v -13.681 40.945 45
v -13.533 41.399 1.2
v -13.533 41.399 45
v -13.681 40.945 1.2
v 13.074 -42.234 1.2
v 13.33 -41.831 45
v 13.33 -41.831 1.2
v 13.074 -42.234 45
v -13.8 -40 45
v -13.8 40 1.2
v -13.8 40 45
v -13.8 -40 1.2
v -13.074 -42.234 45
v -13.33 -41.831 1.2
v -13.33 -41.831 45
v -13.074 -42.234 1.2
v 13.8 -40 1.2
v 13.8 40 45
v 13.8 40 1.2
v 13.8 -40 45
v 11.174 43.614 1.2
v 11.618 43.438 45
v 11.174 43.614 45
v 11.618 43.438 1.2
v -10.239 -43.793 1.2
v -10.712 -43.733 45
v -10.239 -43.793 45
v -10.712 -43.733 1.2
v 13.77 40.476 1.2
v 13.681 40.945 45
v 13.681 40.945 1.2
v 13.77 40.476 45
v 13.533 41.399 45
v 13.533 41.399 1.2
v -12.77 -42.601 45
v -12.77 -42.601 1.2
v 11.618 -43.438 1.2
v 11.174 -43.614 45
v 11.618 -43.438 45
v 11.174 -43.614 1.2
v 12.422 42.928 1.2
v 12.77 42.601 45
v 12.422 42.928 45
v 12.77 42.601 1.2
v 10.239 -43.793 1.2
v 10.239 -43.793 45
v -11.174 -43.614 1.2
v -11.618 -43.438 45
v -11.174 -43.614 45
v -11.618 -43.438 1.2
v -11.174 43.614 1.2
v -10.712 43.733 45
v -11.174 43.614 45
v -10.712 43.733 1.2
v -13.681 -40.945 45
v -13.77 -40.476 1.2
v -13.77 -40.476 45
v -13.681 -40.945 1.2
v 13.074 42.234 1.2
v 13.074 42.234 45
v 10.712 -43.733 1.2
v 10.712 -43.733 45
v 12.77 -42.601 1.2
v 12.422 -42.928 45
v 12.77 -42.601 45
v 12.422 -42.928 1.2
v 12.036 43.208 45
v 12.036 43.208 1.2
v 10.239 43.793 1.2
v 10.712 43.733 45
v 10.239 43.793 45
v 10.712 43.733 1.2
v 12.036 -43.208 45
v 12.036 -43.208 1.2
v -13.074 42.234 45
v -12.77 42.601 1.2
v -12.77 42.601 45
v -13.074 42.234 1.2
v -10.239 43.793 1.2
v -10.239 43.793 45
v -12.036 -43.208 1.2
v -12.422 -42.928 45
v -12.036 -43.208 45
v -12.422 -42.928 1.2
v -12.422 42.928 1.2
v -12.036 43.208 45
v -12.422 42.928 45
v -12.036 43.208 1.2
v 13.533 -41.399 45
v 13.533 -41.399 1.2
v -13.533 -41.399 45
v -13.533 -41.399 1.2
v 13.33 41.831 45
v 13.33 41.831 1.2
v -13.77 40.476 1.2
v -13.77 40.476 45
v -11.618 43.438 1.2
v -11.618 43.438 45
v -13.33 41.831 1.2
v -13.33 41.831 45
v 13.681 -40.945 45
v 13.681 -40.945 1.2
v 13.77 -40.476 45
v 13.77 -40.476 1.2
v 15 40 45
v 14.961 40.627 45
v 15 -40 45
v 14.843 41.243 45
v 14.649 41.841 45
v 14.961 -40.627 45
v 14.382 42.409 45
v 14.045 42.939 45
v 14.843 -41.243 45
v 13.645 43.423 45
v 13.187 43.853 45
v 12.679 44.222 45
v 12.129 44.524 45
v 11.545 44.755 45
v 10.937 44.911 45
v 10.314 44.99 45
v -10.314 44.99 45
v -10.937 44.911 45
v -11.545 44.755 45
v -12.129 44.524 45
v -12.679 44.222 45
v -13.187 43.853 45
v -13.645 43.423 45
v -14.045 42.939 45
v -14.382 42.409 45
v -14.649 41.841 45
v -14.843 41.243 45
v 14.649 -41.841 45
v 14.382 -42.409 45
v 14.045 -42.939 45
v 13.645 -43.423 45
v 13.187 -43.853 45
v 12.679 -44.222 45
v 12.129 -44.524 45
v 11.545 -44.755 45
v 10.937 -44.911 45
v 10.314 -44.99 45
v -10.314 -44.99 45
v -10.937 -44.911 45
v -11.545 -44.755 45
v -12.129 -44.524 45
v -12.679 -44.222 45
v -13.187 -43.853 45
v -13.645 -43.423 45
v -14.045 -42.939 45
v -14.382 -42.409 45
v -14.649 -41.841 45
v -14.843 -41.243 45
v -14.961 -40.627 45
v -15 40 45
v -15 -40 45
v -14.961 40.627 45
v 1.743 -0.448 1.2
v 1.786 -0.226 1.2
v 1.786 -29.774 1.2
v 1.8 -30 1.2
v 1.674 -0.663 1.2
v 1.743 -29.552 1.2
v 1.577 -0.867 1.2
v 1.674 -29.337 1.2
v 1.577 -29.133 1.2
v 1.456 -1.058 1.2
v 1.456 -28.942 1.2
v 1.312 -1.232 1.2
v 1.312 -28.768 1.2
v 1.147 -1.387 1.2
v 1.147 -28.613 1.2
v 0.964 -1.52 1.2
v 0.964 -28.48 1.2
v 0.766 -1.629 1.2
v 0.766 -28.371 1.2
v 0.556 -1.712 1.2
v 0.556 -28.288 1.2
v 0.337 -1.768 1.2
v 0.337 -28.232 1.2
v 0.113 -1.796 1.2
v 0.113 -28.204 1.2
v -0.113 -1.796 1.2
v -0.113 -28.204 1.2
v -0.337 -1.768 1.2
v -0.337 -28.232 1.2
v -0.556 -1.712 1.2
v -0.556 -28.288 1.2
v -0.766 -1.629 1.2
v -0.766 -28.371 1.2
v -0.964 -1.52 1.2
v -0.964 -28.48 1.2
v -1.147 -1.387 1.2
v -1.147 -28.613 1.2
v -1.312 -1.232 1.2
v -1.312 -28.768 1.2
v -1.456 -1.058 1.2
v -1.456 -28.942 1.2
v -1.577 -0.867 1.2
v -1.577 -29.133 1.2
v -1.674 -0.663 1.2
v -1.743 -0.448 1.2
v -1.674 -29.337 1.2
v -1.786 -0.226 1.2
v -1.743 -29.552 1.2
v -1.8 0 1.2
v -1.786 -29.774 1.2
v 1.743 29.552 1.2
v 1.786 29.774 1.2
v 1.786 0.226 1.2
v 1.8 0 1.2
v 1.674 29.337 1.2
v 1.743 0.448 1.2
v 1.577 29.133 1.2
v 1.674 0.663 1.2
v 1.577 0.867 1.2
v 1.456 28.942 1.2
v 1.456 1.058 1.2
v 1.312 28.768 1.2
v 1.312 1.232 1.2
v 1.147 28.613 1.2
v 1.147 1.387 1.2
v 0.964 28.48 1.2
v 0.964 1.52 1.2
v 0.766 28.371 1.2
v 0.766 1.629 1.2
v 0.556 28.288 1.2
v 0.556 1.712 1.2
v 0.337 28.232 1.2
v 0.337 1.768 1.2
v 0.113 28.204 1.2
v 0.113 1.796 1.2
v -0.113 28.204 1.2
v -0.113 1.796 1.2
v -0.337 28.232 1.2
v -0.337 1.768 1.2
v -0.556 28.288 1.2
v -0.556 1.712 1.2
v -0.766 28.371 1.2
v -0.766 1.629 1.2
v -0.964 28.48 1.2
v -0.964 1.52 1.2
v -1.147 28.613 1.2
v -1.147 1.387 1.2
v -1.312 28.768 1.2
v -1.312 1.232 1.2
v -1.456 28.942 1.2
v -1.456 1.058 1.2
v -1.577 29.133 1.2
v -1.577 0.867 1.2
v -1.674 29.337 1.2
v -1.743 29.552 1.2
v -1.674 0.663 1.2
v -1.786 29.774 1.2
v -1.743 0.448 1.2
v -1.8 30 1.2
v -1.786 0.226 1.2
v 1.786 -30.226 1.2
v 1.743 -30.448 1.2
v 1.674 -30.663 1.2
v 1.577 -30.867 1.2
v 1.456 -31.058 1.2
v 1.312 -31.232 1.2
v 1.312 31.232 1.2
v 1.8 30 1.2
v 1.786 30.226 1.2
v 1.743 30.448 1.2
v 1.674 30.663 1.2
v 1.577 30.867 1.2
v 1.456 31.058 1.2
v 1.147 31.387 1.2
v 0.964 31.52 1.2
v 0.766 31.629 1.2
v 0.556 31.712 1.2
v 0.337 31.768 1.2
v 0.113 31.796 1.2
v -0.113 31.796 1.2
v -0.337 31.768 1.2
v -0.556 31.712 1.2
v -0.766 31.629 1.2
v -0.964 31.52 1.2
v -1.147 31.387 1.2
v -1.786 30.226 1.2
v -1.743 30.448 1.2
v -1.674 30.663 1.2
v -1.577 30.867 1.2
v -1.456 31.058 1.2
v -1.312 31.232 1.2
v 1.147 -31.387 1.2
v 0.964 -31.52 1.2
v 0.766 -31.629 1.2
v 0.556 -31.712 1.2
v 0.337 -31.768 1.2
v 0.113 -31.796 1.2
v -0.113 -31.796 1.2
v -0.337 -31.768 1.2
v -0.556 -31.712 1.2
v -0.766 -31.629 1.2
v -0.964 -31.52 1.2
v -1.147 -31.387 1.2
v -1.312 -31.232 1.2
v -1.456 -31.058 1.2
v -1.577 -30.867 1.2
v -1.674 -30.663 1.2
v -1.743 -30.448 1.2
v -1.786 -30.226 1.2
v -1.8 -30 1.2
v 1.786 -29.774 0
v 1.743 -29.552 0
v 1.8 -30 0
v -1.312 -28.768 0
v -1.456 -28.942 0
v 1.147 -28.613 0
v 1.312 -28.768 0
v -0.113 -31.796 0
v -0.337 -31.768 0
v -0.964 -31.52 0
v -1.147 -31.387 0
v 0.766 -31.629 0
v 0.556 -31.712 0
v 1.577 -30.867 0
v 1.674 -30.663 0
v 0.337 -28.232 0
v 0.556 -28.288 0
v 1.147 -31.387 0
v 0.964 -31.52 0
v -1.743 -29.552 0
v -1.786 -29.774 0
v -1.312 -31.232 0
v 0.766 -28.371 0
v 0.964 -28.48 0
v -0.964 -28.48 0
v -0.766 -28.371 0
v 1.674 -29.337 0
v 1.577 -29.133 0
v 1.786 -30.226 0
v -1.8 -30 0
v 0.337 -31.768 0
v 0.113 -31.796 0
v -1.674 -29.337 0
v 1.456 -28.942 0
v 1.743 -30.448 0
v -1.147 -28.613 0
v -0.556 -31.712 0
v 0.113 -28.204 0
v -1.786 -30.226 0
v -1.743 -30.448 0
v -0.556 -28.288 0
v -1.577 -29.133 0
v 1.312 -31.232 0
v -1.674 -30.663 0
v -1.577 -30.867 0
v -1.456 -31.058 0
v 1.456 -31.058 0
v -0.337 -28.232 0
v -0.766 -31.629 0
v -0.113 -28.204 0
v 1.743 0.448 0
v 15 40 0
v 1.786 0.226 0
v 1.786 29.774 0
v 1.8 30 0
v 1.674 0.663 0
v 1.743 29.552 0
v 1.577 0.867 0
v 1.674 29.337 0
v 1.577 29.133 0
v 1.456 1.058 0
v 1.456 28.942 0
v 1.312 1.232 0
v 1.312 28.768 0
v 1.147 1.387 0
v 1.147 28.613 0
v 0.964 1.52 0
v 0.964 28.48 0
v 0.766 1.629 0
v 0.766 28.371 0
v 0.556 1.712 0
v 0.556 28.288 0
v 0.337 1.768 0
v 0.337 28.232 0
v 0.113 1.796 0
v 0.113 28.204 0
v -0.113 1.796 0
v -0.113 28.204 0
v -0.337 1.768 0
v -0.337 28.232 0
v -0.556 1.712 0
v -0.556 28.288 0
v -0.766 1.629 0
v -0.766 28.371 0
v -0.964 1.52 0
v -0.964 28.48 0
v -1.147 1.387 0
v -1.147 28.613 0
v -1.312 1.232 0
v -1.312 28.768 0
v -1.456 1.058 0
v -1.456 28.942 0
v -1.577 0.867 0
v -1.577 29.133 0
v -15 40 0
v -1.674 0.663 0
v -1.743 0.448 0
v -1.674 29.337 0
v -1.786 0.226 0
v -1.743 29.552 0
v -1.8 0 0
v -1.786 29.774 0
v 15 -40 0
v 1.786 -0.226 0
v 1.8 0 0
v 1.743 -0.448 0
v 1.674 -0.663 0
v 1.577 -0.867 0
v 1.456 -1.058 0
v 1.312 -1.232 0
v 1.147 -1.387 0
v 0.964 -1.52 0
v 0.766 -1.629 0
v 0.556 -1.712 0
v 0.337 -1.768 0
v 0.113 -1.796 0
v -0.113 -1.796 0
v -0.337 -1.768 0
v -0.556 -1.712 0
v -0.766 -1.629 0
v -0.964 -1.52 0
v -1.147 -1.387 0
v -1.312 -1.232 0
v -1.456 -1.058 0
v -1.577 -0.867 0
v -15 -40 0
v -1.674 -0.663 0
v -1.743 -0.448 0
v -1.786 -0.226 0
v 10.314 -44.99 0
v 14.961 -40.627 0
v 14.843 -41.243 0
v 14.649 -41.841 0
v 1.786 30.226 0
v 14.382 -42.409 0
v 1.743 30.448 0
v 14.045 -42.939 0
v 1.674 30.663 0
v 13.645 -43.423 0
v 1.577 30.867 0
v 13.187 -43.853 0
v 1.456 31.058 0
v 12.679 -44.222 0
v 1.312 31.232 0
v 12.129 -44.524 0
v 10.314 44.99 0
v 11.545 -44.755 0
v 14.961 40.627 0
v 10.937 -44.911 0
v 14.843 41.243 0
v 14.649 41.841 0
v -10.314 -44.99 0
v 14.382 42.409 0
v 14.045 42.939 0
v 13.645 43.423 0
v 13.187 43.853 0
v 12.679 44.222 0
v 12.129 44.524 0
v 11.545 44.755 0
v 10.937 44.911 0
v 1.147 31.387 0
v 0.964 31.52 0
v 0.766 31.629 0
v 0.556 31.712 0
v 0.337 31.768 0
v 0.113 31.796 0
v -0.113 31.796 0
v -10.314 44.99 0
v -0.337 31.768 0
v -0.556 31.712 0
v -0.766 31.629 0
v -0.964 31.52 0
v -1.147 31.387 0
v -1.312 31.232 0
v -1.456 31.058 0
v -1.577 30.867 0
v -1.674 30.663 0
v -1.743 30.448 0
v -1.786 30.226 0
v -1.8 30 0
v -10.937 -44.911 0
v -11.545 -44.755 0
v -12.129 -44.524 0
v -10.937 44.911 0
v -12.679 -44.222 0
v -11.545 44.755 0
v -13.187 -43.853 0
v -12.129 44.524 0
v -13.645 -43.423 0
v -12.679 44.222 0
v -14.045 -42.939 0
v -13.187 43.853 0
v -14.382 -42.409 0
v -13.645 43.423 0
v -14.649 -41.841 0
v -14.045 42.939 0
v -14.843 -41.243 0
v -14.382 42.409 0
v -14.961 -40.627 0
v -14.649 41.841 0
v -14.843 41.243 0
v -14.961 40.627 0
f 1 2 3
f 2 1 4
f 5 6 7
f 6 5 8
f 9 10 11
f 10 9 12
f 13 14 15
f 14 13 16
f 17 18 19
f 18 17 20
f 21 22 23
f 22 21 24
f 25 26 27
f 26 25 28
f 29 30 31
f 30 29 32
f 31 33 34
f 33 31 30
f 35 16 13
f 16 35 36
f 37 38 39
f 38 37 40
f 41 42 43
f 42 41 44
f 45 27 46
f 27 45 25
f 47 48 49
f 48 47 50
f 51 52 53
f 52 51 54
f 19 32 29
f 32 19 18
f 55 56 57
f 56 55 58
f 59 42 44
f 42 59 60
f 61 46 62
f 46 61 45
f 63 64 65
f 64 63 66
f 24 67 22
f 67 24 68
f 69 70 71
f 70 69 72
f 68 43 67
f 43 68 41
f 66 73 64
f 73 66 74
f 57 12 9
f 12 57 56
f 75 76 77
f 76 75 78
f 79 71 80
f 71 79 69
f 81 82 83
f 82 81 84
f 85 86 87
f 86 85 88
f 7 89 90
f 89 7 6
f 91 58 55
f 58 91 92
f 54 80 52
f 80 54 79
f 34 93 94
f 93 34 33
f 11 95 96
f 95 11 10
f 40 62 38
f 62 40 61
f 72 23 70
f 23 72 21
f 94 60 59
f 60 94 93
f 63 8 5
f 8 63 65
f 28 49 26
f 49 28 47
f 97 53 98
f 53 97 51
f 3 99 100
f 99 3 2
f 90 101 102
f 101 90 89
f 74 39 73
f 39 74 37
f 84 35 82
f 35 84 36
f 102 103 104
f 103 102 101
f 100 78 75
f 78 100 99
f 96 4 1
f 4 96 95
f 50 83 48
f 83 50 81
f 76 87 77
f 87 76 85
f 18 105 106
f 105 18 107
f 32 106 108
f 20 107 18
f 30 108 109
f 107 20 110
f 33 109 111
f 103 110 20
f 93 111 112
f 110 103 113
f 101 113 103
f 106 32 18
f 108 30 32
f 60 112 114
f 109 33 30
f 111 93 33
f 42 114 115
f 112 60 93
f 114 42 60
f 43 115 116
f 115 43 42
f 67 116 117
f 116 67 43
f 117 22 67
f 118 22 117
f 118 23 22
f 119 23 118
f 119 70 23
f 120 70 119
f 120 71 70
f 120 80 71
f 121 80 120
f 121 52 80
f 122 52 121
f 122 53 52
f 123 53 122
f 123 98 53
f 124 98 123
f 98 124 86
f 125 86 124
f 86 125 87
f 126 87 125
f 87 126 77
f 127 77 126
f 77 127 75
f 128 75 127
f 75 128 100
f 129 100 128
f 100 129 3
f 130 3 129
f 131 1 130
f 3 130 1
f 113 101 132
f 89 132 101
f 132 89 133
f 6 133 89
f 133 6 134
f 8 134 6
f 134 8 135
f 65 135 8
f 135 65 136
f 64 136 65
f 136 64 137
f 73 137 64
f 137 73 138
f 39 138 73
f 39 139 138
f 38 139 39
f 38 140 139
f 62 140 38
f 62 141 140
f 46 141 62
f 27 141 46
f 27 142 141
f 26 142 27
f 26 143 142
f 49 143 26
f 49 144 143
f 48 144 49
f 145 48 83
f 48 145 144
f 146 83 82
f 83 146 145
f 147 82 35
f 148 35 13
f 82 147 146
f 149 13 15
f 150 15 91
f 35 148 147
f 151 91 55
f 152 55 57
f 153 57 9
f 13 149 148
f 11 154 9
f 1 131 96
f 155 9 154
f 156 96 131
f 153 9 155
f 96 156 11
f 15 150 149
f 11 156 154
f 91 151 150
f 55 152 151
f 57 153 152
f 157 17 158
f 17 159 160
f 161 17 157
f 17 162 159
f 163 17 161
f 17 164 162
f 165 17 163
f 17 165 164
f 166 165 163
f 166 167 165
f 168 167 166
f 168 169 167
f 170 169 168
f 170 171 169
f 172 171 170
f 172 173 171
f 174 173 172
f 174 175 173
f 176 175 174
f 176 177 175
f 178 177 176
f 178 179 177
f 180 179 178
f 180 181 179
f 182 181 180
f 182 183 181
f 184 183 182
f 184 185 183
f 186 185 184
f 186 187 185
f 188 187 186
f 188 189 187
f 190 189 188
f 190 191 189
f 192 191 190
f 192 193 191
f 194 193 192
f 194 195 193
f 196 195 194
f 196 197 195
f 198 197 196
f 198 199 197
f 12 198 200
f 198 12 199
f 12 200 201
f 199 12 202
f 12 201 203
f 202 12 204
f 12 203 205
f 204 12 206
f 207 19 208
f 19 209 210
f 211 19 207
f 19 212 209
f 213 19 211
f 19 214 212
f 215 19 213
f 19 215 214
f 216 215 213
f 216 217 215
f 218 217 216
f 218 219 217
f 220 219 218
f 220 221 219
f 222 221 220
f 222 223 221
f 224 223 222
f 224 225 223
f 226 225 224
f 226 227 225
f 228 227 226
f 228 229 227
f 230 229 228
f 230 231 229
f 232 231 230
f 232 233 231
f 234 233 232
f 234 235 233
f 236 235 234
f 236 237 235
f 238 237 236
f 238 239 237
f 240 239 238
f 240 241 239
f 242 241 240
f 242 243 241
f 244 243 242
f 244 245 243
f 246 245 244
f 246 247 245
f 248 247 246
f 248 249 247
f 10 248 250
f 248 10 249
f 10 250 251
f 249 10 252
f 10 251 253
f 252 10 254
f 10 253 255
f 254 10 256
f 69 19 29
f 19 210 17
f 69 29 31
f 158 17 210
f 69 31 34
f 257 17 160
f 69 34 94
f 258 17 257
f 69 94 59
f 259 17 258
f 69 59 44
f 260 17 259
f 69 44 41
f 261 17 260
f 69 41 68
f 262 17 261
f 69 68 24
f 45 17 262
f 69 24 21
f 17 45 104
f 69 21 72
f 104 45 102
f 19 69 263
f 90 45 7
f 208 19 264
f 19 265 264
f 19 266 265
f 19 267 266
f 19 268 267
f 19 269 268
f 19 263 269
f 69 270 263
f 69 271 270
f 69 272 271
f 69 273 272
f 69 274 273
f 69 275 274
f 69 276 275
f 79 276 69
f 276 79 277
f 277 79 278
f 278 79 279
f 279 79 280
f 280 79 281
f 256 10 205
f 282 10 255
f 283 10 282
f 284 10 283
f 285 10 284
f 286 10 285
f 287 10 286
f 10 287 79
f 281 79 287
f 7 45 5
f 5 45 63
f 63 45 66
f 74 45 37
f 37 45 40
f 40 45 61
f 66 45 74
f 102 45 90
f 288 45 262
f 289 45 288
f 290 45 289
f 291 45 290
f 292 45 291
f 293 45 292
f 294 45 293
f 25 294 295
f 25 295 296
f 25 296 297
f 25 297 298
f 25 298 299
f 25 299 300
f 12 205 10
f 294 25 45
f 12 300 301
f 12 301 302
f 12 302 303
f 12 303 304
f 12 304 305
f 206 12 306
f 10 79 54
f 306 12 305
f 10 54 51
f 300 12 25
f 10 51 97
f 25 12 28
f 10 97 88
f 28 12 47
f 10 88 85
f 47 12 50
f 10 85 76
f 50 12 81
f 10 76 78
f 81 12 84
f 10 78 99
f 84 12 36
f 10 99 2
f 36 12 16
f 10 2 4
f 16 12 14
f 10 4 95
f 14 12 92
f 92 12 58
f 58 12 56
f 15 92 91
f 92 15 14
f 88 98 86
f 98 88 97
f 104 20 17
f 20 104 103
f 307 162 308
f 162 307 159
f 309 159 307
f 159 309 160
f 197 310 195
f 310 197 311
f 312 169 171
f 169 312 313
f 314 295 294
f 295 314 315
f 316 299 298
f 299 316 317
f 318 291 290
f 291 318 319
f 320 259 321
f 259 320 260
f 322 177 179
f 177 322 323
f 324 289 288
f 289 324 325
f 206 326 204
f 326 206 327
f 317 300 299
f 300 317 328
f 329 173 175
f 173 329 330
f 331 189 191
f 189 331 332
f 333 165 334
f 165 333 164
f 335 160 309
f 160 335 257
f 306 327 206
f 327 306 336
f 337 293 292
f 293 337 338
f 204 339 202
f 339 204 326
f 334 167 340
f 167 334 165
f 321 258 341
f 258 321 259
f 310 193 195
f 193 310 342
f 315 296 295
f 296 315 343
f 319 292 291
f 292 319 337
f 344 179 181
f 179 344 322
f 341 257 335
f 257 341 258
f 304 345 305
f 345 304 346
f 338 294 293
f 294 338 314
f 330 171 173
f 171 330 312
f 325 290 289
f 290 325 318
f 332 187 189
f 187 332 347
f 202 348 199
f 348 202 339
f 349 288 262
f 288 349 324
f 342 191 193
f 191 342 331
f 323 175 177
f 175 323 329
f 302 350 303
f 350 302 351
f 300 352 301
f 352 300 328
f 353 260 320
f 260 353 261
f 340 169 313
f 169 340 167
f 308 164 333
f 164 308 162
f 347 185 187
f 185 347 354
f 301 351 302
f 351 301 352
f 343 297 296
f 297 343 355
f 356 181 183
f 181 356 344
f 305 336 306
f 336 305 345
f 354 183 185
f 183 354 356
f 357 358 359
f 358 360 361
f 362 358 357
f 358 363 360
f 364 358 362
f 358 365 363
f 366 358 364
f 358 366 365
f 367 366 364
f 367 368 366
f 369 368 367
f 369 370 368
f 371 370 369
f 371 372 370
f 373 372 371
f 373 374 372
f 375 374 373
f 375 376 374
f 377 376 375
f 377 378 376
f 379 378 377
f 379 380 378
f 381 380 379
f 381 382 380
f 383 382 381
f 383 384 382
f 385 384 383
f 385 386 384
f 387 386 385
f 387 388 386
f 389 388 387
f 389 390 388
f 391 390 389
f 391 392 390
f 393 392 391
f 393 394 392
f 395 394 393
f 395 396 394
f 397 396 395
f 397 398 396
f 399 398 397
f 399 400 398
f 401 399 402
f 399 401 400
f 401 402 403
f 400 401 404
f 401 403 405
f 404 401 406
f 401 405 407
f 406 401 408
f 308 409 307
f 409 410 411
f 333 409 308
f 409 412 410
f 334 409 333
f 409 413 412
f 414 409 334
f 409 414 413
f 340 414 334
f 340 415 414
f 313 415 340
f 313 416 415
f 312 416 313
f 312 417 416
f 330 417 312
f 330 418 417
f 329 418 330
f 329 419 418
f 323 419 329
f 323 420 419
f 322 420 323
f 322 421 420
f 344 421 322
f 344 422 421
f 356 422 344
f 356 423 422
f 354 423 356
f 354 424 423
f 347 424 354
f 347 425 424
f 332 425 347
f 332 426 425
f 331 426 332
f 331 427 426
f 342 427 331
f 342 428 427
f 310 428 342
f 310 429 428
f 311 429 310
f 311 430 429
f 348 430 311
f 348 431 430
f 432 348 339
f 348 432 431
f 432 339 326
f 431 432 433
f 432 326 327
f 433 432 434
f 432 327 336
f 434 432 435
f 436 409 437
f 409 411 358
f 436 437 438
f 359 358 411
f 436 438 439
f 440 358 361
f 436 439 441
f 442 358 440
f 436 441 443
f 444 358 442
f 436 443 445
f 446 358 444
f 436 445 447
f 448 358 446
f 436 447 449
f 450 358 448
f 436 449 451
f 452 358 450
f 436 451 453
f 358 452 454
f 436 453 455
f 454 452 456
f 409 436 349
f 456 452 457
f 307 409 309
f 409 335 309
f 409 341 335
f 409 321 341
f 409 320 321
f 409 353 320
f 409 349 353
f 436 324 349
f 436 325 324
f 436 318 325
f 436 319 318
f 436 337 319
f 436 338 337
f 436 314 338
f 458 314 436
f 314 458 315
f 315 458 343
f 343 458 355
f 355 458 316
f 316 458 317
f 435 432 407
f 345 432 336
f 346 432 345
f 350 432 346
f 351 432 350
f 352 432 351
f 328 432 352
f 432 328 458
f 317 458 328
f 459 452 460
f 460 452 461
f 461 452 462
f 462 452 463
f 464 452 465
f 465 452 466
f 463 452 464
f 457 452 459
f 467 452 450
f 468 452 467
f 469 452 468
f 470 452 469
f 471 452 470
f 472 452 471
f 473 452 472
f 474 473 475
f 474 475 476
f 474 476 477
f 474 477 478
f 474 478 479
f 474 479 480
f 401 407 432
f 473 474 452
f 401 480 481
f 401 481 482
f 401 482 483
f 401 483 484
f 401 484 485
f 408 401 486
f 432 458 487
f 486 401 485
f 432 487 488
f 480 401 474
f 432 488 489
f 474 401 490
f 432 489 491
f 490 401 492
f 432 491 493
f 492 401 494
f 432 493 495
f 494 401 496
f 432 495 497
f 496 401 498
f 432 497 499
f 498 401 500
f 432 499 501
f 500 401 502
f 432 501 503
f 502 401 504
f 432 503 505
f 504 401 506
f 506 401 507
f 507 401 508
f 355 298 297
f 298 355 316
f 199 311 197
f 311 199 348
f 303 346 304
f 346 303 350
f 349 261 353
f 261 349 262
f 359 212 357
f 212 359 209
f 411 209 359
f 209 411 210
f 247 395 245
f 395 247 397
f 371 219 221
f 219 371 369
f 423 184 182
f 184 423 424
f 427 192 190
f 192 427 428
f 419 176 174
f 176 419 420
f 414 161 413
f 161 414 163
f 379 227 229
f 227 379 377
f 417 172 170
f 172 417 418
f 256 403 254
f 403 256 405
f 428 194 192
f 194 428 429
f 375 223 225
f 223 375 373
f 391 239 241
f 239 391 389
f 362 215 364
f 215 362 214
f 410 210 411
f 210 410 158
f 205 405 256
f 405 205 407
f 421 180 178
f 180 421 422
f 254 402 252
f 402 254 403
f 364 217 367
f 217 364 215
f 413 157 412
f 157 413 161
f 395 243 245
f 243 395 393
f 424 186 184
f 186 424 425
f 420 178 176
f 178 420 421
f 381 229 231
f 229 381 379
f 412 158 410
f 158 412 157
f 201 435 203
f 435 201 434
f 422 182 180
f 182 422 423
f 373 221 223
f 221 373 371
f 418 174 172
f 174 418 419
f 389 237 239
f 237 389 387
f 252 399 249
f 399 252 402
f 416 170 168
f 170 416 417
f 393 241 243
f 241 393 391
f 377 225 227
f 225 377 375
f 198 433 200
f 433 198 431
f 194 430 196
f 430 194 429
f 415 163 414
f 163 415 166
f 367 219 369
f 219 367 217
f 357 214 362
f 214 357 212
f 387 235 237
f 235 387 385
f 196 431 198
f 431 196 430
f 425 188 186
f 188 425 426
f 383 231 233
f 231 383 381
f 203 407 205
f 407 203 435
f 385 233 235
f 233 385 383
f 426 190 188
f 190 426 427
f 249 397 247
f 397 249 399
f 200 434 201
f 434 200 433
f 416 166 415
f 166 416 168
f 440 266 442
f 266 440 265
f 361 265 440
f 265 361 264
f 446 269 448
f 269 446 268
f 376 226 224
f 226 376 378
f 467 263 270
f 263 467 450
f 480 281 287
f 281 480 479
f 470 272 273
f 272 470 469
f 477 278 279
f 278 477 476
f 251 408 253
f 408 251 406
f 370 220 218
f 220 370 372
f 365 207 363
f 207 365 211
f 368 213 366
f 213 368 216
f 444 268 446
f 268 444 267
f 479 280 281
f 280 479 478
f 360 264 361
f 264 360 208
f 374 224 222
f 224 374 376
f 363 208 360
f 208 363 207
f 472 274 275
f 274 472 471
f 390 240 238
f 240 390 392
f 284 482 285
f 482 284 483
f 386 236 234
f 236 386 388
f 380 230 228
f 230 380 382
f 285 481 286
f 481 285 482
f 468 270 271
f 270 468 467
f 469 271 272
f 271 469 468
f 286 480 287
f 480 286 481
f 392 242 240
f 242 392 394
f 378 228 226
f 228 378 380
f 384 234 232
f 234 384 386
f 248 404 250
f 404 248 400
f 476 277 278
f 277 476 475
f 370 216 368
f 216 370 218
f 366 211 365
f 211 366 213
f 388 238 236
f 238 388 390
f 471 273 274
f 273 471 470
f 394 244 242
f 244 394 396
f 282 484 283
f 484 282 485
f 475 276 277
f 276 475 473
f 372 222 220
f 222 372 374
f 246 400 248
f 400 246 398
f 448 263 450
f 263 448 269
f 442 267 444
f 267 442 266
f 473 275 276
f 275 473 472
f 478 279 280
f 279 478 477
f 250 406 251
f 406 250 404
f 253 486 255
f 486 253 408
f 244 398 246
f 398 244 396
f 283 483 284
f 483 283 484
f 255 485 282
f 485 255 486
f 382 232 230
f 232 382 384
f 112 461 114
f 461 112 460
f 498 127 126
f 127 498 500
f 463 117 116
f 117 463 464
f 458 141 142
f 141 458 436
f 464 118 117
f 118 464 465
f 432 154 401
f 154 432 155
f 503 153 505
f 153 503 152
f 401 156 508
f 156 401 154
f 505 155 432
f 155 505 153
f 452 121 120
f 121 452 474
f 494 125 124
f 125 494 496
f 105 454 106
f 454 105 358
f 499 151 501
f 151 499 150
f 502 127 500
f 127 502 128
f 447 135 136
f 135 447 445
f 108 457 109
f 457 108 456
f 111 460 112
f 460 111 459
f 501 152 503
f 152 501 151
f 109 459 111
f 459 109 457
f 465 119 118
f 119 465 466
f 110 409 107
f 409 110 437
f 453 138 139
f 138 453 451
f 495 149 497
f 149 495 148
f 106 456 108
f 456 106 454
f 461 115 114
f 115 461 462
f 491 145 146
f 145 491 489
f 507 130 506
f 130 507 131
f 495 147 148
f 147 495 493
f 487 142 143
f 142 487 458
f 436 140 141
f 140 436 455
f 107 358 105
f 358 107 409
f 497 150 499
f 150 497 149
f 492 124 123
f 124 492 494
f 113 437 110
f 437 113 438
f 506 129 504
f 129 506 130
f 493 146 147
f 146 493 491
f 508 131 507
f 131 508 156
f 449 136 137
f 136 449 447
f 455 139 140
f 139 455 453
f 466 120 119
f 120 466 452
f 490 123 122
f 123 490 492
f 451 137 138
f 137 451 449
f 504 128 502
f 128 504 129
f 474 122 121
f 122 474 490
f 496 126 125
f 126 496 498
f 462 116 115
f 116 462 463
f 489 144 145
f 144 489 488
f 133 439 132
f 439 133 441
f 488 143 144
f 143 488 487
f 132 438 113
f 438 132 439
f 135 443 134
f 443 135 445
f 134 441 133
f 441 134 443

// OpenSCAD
$fn = 50;


difference() {
	union() {
		hull() {
			translate(v = [-10.0000000000, 40.0000000000, 0]) {
				cylinder(h = 45, r = 5);
			}
			translate(v = [10.0000000000, 40.0000000000, 0]) {
				cylinder(h = 45, r = 5);
			}
			translate(v = [-10.0000000000, -40.0000000000, 0]) {
				cylinder(h = 45, r = 5);
			}
			translate(v = [10.0000000000, -40.0000000000, 0]) {
				cylinder(h = 45, r = 5);
			}
		}
	}
	union() {
		translate(v = [0, 0, 1.2000000000]) {
			hull() {
				translate(v = [-10.0000000000, 40.0000000000, 0]) {
					cylinder(h = 43.8000000000, r = 3.8000000000);
				}
				translate(v = [10.0000000000, 40.0000000000, 0]) {
					cylinder(h = 43.8000000000, r = 3.8000000000);
				}
				translate(v = [-10.0000000000, -40.0000000000, 0]) {
					cylinder(h = 43.8000000000, r = 3.8000000000);
				}
				translate(v = [10.0000000000, -40.0000000000, 0]) {
					cylinder(h = 43.8000000000, r = 3.8000000000);
				}
			}
		}
		#translate(v = [0.0000000000, -30.0000000000, 0]) {
			cylinder(h = 1.2000000000, r = 1.8000000000);
		}
		#cylinder(h = 1.2000000000, r = 1.8000000000);
		#translate(v = [0.0000000000, 30.0000000000, 0]) {
			cylinder(h = 1.2000000000, r = 1.8000000000);
		}
	}
}
